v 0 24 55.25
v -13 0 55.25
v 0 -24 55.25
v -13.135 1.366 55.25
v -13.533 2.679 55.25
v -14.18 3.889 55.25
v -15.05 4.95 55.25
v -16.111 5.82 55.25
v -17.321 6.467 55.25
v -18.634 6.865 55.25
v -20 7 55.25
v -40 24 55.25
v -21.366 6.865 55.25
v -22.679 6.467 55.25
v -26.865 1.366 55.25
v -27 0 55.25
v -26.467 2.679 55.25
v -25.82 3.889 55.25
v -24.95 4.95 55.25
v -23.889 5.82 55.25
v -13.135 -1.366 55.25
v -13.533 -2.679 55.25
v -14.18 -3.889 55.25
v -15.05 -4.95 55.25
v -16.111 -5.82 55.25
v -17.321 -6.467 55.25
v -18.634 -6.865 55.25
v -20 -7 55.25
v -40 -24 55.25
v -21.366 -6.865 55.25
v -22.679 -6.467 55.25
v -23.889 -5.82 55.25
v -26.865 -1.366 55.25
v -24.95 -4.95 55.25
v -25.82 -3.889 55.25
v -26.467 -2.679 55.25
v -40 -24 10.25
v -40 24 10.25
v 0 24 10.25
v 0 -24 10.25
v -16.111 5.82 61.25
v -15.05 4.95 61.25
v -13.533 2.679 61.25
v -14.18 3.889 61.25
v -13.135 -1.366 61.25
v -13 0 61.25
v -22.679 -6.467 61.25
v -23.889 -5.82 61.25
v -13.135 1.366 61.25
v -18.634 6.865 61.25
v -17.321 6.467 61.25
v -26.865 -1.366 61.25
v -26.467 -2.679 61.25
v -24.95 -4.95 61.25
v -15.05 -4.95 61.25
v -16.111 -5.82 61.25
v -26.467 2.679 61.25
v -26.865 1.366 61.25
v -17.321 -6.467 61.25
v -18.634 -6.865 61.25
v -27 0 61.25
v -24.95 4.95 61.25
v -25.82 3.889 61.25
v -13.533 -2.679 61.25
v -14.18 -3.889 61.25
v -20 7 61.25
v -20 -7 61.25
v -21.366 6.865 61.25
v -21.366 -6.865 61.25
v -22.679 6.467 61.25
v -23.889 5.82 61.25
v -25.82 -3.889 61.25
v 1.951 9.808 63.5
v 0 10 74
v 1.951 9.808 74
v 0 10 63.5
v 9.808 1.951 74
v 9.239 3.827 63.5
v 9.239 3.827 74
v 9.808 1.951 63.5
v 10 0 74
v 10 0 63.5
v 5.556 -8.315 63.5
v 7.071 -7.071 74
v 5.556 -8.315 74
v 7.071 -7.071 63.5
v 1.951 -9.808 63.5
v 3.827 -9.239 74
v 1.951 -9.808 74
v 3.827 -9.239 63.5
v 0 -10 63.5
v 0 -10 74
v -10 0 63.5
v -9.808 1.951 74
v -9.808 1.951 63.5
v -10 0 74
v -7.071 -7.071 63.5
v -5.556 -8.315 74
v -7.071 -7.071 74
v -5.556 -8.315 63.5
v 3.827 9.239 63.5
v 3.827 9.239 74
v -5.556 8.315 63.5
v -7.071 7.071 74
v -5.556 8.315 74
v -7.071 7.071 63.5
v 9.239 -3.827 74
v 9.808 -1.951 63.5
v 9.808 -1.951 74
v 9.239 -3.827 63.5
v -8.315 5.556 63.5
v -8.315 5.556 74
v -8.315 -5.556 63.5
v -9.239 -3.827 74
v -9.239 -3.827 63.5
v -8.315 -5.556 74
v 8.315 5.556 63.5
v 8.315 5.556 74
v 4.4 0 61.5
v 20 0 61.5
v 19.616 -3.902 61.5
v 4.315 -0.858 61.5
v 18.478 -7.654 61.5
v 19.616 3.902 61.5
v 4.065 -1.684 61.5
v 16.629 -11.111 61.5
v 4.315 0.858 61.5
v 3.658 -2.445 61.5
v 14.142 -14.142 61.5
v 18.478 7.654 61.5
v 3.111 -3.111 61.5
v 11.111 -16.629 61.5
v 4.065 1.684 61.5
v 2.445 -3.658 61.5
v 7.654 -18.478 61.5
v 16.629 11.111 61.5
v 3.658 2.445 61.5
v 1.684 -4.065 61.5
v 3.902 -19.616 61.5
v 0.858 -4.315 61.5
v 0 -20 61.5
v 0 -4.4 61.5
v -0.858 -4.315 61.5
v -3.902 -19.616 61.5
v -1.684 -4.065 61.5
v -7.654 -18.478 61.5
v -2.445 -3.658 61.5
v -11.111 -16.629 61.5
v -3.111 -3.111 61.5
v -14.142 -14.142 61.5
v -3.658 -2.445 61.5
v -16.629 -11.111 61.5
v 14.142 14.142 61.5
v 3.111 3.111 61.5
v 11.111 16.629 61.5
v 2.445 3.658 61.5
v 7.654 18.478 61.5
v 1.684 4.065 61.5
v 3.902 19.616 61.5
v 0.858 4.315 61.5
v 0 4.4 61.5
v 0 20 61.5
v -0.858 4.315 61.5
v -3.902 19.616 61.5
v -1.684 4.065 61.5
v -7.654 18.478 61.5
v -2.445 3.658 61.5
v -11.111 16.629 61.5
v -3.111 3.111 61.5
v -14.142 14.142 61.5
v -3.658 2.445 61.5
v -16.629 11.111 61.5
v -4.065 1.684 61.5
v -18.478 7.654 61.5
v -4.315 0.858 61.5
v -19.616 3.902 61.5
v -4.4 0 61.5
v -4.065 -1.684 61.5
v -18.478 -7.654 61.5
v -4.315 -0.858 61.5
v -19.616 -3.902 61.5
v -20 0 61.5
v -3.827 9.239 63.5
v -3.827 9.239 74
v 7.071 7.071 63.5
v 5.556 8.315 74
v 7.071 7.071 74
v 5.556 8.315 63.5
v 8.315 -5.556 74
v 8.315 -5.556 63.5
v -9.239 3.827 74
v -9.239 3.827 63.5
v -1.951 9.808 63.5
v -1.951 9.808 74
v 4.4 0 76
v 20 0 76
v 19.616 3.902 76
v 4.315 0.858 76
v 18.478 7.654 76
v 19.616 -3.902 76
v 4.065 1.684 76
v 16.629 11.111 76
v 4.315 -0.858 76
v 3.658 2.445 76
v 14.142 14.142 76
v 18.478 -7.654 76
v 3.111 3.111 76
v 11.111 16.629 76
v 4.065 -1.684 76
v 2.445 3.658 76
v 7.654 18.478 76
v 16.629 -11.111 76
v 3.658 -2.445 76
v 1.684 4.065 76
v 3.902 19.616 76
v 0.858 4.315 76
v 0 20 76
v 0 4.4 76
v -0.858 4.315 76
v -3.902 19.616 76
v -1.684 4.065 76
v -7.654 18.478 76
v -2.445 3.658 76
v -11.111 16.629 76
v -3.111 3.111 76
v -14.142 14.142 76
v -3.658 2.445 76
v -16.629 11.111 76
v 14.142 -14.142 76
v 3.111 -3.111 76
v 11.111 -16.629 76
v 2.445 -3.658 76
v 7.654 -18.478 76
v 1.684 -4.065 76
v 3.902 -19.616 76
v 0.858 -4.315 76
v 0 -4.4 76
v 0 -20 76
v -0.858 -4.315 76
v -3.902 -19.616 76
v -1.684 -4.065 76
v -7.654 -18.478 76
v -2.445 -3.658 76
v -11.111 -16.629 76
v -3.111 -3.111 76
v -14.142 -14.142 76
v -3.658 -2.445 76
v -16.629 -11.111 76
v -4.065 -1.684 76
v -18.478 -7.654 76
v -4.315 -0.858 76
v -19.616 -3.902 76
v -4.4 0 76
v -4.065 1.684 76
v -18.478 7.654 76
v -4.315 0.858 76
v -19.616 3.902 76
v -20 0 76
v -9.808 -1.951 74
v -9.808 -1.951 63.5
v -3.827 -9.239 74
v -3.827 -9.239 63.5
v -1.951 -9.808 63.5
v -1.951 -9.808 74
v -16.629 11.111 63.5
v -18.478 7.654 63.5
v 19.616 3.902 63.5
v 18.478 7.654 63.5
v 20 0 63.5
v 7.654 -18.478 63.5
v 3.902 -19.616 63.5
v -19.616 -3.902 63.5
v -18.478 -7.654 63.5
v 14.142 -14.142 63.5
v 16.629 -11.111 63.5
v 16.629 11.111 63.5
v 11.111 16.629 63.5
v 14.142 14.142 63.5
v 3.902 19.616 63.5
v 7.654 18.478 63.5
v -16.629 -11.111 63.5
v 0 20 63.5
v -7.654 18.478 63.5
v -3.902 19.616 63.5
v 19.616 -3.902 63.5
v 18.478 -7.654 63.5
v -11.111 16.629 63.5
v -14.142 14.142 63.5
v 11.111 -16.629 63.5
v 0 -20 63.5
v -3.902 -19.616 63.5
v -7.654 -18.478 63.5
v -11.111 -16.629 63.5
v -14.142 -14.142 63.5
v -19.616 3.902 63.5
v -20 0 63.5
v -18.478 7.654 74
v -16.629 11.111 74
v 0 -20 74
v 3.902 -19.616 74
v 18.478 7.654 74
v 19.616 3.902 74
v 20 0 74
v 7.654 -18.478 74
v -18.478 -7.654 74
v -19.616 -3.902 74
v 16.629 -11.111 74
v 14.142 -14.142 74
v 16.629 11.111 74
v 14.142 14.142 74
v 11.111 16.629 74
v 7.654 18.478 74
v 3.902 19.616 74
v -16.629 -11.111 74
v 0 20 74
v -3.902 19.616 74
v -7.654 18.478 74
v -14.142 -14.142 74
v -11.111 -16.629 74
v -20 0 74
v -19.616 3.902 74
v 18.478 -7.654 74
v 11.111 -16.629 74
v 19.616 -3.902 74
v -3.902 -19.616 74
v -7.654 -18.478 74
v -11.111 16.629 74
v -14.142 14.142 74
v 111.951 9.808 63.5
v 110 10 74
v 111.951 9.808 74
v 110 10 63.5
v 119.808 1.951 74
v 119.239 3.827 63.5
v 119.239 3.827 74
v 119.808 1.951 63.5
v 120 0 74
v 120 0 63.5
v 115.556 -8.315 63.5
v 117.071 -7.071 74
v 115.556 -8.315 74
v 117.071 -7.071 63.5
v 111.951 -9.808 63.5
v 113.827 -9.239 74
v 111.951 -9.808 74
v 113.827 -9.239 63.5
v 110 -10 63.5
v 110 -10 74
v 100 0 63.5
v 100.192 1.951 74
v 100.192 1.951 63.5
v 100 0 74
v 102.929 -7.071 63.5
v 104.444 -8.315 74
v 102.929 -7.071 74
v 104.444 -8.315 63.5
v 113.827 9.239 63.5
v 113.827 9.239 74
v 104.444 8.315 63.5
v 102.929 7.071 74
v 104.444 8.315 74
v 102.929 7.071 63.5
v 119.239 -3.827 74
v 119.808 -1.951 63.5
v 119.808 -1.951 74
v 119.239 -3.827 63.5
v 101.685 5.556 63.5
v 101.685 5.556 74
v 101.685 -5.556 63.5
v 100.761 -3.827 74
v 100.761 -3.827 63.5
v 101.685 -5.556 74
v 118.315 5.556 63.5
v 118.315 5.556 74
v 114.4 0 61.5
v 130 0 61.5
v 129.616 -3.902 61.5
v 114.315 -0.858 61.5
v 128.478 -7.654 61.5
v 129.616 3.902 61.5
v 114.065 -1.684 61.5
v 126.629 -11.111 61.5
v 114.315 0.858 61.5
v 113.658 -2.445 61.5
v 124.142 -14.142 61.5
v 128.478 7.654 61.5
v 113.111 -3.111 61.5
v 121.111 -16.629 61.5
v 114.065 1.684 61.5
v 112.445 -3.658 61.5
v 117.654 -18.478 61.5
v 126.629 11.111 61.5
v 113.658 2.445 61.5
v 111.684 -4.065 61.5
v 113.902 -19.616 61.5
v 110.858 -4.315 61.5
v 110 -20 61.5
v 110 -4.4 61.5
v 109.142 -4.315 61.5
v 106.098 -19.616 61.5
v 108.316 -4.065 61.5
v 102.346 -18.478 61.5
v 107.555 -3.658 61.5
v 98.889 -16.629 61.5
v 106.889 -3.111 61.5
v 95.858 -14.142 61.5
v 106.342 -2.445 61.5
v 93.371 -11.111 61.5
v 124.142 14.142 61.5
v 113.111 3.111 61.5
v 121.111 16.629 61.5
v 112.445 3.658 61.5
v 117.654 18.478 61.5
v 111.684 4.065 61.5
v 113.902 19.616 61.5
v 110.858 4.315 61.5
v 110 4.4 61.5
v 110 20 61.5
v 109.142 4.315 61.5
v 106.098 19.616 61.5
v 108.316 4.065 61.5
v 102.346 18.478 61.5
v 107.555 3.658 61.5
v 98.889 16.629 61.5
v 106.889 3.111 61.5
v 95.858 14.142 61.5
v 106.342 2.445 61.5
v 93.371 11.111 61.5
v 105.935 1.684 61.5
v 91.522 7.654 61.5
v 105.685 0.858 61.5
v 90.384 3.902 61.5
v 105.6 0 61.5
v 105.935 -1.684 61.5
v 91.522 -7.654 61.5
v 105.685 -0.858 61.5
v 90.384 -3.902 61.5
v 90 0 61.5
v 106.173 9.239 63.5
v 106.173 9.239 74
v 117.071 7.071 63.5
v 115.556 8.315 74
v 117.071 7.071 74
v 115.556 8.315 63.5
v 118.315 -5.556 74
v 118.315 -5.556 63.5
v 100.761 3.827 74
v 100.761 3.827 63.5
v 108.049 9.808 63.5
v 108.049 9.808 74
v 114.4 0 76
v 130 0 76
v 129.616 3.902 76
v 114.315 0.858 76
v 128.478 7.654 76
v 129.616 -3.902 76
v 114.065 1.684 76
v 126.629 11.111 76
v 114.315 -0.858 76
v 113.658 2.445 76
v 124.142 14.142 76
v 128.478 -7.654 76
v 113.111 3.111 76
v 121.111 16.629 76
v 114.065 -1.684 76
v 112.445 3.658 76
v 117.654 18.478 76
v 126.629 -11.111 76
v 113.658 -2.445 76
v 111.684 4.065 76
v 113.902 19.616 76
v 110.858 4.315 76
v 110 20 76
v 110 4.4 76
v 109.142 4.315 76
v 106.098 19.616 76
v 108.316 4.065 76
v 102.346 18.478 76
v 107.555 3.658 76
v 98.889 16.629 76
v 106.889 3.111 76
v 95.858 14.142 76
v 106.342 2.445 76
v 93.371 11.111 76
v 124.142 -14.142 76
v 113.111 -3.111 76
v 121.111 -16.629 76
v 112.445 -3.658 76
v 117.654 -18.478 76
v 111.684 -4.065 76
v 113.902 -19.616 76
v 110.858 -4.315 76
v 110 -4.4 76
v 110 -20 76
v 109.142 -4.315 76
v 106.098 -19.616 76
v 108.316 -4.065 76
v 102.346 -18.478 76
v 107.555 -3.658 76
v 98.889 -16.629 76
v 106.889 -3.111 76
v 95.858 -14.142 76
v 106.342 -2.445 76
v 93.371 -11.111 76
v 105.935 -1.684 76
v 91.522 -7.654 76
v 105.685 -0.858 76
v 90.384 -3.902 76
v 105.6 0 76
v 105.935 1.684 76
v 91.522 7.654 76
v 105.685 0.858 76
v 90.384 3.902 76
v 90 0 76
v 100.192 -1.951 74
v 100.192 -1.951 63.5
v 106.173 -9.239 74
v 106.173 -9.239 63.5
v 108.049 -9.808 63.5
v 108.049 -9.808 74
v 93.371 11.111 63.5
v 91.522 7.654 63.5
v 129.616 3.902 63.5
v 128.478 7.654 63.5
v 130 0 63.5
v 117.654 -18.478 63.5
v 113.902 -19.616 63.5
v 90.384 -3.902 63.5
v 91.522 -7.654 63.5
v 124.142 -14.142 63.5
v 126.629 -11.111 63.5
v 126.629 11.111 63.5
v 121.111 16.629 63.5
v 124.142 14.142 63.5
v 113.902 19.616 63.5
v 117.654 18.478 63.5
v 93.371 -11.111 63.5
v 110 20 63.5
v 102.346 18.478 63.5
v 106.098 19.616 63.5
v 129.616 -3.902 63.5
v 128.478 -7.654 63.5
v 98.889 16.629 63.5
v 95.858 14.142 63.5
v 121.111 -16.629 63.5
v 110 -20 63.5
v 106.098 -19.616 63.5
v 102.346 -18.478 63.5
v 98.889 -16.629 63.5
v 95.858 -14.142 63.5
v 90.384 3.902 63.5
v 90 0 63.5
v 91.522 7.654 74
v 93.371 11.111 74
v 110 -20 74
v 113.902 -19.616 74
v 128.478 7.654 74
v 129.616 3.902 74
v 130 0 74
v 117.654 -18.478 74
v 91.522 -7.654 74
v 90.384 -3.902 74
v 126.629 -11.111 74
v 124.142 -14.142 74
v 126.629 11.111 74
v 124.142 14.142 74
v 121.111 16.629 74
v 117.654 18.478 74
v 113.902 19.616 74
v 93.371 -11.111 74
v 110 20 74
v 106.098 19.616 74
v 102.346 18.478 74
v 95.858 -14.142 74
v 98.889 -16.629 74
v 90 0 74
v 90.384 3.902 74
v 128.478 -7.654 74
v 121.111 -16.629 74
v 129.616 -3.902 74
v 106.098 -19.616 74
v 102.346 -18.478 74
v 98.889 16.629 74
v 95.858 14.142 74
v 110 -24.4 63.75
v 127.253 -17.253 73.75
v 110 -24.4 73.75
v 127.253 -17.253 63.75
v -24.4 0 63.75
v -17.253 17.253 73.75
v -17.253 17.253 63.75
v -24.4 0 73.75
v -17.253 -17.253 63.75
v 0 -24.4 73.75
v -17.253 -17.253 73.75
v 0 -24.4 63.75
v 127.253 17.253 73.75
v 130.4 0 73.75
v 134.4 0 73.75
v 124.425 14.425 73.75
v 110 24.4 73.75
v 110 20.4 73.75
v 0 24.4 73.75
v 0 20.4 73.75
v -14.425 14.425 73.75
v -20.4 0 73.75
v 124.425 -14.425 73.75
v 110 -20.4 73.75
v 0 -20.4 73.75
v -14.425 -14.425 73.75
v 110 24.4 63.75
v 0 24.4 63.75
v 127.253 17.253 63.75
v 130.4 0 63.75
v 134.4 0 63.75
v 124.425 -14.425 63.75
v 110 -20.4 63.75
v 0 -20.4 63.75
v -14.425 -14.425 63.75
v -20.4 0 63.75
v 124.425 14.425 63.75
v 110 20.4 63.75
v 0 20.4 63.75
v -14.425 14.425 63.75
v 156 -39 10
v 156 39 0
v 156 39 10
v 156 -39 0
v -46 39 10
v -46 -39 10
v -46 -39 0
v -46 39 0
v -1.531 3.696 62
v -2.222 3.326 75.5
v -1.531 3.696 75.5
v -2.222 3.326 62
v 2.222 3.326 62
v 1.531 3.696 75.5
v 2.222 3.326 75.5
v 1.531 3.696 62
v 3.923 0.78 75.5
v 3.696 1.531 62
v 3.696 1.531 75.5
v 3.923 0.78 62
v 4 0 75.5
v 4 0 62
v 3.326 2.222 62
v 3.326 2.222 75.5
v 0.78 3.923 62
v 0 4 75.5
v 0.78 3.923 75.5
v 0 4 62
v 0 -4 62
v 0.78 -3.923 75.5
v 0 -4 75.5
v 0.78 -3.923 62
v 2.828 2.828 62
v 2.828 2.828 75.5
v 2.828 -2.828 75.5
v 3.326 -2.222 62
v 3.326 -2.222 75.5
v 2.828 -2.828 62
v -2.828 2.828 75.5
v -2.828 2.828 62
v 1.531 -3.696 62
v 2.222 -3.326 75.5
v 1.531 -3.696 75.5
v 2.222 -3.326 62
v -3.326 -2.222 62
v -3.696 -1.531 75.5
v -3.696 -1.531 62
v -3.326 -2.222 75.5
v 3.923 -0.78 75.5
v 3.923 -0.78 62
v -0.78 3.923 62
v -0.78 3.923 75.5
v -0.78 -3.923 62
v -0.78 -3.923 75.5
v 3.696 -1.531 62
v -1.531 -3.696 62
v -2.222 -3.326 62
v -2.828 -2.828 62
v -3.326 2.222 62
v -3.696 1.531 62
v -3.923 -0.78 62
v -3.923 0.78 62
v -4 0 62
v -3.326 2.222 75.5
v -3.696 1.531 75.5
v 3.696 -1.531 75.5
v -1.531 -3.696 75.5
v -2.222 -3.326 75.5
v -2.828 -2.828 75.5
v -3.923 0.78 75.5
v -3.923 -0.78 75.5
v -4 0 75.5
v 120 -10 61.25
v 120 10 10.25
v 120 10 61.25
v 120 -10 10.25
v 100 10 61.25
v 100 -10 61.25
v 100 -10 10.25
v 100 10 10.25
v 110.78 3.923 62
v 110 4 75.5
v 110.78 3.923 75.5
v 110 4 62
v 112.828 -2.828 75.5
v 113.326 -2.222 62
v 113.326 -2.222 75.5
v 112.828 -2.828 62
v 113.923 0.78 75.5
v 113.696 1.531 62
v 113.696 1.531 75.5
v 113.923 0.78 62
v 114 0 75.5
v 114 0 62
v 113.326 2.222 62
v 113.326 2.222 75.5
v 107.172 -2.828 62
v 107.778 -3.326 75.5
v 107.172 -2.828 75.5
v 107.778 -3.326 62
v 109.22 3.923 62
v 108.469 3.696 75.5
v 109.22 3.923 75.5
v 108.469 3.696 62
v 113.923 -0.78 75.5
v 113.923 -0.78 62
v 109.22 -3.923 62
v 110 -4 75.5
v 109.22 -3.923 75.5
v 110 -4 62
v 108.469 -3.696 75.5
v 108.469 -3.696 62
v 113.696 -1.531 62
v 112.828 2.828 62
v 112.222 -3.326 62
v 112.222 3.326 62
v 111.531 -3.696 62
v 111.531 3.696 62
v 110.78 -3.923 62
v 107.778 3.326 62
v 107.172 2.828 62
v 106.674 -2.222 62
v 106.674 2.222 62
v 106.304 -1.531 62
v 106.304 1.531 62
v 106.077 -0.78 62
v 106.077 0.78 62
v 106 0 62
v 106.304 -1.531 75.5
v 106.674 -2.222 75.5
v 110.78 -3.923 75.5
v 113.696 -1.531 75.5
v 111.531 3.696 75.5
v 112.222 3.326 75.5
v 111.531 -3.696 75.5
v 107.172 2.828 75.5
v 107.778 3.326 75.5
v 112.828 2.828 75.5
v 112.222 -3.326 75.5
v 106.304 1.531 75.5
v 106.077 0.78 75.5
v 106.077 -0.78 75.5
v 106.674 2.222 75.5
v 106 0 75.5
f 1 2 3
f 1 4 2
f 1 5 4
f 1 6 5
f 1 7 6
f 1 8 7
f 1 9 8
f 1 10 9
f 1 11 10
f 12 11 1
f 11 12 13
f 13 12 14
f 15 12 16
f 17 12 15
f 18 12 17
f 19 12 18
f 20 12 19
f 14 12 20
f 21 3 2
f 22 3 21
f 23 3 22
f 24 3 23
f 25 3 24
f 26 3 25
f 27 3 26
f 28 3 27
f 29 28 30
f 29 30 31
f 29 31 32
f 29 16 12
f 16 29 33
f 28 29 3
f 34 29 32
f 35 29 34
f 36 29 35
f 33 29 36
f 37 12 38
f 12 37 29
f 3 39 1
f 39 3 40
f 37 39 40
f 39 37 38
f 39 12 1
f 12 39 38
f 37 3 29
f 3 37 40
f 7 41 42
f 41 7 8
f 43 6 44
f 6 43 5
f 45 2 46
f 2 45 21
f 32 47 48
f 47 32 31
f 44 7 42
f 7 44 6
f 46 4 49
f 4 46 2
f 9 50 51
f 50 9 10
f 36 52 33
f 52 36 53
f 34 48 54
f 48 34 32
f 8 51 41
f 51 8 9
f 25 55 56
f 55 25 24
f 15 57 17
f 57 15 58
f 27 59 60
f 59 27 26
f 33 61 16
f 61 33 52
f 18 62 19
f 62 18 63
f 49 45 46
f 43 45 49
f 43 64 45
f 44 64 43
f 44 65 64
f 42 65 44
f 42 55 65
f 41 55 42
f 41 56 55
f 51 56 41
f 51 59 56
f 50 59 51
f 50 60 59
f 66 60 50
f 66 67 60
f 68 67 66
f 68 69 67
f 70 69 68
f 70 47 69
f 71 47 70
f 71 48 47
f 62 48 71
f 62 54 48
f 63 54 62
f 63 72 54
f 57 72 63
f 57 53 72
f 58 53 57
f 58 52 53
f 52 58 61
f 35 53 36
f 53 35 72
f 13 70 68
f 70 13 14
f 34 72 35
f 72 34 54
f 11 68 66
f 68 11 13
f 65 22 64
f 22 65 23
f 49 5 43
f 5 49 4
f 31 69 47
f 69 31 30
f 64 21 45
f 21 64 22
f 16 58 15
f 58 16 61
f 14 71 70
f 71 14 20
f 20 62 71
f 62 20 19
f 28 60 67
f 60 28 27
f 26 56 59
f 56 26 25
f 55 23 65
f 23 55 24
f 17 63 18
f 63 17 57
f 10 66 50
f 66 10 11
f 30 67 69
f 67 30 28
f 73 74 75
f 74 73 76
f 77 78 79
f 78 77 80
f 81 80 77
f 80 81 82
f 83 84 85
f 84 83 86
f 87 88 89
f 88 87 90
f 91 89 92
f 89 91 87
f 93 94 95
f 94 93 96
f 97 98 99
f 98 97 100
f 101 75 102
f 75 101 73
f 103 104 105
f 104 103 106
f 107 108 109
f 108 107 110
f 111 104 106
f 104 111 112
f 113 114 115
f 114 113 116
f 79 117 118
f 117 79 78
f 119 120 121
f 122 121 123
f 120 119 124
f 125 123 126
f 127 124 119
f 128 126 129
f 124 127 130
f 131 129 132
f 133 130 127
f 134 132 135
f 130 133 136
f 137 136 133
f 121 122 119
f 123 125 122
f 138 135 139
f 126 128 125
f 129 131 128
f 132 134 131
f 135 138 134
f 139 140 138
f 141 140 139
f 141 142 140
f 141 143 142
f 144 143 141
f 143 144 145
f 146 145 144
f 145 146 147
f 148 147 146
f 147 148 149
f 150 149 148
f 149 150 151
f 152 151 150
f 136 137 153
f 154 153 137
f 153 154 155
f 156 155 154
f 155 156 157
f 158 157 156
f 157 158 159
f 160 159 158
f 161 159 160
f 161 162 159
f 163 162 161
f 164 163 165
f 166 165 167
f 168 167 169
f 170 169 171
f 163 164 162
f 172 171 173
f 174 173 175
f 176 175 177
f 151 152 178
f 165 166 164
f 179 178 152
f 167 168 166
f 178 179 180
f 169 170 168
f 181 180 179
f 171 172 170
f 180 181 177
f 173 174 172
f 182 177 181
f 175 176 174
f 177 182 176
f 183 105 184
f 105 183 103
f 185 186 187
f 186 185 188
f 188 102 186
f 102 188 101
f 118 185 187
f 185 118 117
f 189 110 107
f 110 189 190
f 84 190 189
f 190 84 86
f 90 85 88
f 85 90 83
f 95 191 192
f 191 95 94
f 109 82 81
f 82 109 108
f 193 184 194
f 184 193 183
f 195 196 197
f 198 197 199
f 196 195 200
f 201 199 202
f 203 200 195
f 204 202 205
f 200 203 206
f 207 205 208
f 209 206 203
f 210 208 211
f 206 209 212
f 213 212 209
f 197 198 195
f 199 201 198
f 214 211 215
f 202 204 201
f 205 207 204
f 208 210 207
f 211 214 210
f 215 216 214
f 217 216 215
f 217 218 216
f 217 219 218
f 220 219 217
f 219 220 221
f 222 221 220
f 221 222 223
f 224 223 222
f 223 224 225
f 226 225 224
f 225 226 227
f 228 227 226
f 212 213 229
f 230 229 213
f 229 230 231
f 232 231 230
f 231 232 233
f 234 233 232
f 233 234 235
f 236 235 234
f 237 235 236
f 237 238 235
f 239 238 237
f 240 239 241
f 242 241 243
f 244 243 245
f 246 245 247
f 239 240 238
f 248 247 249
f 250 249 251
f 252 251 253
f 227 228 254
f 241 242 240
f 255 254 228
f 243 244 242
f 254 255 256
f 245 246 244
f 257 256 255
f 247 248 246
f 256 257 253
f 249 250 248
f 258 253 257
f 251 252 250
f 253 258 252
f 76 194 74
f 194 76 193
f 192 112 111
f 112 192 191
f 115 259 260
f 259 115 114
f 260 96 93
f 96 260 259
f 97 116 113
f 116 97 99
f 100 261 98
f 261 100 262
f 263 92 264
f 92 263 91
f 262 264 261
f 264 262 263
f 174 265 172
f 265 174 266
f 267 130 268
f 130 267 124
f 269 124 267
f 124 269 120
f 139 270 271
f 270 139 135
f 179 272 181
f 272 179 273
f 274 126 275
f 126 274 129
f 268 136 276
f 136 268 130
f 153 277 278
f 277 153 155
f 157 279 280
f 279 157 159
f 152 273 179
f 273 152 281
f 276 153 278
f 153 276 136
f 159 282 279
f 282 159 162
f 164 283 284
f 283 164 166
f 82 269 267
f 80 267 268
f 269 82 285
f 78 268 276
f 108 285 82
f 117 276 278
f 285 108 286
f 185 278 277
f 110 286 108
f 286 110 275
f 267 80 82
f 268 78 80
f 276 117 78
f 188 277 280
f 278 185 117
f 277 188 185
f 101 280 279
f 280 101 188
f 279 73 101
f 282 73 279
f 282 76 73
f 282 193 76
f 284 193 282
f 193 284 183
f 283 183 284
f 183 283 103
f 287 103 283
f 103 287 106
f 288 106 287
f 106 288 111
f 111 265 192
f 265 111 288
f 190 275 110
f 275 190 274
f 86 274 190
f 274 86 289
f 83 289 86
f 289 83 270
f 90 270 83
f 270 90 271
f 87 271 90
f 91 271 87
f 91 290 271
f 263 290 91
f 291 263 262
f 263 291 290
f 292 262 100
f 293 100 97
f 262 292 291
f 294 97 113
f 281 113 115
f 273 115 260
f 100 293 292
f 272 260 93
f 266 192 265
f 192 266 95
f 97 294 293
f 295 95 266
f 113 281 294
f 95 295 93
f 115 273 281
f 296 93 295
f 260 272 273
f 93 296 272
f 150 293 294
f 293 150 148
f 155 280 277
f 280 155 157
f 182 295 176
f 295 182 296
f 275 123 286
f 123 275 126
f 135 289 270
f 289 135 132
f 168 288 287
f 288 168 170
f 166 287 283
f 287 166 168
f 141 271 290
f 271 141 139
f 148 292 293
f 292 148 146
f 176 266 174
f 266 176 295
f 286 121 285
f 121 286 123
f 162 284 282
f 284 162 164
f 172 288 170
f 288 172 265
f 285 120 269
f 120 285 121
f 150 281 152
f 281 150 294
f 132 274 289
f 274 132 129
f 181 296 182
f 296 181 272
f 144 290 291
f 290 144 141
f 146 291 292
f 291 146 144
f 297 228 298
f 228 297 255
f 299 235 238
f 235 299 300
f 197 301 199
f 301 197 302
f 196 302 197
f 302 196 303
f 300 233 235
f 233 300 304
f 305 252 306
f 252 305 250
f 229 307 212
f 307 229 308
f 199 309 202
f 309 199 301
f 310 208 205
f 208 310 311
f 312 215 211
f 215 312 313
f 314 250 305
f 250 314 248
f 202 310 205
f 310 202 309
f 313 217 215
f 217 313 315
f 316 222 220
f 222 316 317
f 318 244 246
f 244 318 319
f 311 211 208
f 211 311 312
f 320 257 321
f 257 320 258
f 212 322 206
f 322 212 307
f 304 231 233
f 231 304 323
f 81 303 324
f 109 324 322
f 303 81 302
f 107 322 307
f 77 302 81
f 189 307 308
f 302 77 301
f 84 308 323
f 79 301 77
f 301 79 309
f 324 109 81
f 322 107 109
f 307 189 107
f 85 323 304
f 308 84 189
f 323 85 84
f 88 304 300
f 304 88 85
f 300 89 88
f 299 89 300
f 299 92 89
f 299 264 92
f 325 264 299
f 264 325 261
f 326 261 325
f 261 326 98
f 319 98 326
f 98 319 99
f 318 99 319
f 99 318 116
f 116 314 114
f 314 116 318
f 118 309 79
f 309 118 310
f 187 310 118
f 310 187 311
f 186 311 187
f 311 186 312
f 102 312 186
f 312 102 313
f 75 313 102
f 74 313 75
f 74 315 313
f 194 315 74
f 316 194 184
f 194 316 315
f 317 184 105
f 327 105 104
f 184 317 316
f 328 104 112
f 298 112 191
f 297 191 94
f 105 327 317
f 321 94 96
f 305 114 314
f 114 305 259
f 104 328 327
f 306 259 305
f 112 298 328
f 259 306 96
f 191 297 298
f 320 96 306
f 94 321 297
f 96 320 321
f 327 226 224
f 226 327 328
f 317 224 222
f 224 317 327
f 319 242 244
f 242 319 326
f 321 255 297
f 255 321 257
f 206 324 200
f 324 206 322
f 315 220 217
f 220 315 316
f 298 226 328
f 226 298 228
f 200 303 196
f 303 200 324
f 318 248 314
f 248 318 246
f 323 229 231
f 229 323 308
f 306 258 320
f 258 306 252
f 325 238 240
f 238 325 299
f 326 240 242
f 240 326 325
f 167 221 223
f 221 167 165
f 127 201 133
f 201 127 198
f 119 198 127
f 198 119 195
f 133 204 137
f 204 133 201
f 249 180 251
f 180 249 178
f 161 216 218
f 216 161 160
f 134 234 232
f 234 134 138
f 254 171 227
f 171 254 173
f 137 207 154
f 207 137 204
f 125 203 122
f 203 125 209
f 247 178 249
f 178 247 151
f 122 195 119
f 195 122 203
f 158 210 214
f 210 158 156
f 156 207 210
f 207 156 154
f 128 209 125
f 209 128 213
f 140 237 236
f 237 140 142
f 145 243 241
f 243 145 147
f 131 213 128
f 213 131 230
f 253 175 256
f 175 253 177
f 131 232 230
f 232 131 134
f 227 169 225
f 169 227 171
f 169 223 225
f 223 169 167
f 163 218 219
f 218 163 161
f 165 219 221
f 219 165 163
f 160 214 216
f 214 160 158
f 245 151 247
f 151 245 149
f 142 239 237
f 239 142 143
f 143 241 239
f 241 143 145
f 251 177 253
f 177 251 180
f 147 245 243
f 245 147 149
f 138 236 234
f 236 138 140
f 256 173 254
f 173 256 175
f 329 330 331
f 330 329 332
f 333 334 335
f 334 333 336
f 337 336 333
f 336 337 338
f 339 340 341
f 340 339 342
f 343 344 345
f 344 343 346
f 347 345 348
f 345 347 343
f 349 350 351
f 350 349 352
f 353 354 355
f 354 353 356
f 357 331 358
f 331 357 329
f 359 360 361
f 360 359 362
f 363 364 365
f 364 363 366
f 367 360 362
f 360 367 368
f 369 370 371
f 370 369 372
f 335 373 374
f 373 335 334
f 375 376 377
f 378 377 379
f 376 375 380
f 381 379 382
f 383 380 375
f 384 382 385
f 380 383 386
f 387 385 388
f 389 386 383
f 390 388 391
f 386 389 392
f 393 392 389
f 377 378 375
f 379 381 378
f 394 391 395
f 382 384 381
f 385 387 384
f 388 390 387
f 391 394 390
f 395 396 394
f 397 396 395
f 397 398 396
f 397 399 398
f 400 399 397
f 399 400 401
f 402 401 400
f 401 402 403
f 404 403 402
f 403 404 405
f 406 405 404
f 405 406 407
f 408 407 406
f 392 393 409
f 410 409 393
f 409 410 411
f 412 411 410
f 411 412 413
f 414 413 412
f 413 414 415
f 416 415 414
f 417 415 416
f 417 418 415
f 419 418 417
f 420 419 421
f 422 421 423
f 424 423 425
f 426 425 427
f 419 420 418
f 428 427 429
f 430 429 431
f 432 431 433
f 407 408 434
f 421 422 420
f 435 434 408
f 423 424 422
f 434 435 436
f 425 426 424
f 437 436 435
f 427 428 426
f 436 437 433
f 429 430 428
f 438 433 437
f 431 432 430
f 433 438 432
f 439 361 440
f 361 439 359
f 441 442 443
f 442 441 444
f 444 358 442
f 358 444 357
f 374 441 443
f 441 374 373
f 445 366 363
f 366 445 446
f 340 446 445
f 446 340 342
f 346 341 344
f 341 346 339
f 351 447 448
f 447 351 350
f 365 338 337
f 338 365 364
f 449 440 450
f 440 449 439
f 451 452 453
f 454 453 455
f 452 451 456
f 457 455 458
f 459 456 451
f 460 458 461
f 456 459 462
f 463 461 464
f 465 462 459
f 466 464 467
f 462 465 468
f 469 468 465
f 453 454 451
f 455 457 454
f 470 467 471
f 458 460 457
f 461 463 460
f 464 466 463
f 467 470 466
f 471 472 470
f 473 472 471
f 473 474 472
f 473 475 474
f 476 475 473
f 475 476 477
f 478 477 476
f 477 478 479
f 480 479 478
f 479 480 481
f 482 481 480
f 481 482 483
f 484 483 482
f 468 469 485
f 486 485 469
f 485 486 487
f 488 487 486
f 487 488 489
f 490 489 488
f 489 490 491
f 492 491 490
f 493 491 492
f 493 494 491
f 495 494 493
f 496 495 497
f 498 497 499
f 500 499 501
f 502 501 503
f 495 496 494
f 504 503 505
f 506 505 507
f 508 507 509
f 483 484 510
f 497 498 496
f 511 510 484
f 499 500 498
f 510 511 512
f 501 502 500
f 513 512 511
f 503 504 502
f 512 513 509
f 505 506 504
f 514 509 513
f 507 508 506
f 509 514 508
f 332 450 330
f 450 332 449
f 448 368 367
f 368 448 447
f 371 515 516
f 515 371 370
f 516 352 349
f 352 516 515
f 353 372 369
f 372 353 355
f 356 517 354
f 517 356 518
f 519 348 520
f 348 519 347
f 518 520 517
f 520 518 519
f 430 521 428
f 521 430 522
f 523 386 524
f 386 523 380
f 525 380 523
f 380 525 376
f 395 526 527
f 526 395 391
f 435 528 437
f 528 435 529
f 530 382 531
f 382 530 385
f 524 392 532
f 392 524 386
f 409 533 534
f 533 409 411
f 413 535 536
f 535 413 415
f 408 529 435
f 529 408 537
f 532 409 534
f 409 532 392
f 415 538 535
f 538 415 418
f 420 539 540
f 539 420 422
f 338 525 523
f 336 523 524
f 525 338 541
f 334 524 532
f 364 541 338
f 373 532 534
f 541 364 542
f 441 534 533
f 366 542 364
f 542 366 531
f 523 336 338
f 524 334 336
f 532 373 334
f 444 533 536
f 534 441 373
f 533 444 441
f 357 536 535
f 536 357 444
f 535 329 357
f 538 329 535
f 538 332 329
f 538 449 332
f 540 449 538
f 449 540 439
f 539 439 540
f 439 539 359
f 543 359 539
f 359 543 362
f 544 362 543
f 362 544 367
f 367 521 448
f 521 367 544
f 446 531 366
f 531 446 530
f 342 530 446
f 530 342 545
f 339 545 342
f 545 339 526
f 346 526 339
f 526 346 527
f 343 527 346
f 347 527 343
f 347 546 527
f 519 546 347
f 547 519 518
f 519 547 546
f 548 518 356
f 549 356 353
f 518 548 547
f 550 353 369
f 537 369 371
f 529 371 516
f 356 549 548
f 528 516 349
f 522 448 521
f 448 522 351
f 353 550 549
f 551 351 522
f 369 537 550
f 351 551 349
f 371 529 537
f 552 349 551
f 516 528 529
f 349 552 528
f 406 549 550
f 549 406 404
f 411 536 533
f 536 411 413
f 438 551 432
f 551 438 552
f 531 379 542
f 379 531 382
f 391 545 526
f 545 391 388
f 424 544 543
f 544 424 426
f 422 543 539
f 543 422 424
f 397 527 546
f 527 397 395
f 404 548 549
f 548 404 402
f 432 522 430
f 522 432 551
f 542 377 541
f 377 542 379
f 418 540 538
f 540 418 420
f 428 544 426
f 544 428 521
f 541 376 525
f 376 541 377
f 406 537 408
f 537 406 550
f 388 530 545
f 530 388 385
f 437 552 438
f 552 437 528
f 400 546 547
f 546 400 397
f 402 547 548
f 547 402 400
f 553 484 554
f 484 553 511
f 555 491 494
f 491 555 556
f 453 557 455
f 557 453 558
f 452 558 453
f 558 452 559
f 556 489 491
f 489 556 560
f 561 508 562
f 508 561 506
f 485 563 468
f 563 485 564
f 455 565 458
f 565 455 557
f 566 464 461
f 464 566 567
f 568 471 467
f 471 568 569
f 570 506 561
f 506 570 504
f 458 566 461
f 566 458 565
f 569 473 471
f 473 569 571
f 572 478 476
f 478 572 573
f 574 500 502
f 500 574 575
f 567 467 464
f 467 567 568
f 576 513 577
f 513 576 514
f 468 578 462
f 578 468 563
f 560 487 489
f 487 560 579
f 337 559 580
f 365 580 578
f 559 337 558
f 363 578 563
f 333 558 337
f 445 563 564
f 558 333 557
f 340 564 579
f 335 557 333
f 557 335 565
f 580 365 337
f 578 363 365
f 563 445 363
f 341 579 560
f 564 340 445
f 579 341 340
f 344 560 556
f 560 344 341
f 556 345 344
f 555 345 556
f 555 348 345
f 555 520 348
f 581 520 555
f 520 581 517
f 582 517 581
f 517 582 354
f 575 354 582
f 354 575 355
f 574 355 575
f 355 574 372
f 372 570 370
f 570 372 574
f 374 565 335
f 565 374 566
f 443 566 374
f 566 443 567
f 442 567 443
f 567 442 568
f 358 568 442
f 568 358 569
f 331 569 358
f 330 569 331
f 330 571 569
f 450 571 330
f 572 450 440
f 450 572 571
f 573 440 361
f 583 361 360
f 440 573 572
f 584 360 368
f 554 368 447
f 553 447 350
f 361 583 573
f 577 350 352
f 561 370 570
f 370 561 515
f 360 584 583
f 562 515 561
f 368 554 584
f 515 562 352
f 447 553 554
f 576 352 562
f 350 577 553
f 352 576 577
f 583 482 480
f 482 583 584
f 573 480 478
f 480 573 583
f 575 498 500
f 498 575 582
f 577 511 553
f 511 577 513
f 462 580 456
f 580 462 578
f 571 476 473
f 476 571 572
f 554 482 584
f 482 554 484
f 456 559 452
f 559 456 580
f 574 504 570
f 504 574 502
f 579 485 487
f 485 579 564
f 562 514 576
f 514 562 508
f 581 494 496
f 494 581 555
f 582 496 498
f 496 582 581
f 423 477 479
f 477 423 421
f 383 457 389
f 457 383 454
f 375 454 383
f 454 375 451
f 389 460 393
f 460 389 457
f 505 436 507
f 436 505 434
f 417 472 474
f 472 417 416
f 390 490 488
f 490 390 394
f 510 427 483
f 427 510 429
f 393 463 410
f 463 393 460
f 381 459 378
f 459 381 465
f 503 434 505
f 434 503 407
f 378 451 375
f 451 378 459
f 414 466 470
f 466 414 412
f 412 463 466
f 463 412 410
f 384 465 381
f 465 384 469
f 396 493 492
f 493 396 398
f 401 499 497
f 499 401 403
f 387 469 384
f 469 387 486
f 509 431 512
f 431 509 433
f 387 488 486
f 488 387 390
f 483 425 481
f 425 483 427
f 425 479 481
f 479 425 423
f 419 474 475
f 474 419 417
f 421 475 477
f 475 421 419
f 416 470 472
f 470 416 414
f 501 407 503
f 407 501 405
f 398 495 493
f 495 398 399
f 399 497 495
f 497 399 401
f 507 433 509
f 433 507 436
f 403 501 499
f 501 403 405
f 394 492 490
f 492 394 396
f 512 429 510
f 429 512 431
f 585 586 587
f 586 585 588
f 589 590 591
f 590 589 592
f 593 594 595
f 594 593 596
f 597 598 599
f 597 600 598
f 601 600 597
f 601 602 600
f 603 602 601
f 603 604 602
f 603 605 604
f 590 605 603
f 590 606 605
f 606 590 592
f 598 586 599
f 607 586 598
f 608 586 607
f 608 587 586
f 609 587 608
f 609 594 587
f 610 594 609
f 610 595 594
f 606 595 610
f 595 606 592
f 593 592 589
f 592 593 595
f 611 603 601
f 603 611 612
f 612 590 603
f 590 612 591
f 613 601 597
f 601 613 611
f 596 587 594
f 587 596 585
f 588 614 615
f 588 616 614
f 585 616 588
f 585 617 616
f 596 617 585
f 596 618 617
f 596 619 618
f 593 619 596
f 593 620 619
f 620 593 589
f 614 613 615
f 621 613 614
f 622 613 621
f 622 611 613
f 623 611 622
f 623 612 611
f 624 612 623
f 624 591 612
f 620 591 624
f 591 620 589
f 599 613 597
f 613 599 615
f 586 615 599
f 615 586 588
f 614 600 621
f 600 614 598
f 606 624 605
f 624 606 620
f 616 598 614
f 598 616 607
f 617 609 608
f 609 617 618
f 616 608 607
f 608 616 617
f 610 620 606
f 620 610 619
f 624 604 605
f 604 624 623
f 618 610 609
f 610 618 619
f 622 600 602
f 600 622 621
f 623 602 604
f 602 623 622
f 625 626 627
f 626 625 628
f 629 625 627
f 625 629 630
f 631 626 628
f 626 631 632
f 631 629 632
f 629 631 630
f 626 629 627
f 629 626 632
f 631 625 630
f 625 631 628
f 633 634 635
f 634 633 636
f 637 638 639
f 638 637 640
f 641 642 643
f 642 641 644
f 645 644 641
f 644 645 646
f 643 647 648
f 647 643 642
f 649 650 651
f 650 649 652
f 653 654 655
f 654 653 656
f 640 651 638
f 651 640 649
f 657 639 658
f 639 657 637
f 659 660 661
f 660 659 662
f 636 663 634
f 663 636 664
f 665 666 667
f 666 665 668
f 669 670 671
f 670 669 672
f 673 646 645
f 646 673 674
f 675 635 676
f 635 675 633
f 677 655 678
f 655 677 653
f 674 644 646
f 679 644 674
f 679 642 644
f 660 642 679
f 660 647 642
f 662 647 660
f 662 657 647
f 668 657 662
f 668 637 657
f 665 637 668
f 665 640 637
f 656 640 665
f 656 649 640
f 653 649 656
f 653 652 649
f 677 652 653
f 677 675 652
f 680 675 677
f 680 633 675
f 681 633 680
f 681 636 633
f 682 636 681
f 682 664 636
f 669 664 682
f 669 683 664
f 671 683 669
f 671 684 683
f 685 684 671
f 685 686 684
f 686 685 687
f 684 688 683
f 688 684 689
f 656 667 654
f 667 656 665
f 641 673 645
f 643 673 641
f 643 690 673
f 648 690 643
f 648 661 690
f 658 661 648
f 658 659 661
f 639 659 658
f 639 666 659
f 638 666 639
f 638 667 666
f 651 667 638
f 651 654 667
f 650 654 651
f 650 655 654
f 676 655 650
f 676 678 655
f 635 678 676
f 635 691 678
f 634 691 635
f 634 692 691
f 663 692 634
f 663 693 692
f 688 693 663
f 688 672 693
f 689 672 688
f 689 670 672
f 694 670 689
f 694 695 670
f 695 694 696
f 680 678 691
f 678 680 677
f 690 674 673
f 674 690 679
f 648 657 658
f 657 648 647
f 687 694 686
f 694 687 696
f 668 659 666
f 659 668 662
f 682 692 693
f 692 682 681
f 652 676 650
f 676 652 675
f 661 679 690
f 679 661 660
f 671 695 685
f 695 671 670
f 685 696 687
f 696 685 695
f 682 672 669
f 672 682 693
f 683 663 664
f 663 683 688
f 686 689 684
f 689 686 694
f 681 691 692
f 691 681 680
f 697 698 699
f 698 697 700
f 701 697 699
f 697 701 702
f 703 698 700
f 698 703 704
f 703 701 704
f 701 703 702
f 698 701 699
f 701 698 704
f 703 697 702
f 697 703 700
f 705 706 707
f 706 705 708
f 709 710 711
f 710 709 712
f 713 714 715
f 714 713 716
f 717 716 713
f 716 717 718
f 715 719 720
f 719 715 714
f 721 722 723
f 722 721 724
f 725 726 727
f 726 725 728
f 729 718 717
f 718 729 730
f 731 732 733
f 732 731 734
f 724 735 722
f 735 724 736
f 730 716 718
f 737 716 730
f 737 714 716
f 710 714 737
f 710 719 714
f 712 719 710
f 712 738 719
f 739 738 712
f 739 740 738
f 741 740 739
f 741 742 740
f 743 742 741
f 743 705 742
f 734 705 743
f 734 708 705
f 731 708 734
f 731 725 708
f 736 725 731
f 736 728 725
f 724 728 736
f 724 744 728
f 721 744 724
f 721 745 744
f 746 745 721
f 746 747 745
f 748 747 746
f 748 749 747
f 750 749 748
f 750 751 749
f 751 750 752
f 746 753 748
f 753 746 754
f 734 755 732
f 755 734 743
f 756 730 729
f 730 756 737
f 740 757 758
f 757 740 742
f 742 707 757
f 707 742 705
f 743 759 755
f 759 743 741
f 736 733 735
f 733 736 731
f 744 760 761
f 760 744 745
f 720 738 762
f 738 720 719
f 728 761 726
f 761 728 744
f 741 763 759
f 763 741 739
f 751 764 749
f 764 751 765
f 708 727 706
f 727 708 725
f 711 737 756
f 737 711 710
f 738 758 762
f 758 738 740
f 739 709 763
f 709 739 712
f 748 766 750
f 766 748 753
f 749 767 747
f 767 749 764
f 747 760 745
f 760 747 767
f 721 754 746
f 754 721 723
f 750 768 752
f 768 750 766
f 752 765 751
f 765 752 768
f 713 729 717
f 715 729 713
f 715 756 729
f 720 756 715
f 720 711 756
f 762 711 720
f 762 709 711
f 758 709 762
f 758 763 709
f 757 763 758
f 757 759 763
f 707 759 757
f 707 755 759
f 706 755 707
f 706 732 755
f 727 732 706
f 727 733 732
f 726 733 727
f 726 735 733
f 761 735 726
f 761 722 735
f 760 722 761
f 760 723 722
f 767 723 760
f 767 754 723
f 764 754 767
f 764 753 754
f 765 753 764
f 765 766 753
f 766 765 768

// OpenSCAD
$fn = 32;

// ------------------------------------------------------------------------
// Motor belt drive: span 110 mm, pulleys d40, belt 10 mm wide
// Every part is its own module, assembly() places every instance.
// ------------------------------------------------------------------------

// --- part 1 ---
module base_plate() {
  difference() {
    translate([-101, -39, 0]) cube([202, 78, 10]);
  }
}

// --- part 2 ---
module motor() {
  union() {
    translate([-22.5, -24, 0]) cube([45, 48, 40]);
    translate([25.5, 0, 20]) rotate([0, 90, 0]) cylinder(h = 6, d = 14, center = true);
  }
}

// --- part 3 ---
module drive_shaft() {
  translate([0, 0, -6.75]) cylinder(h = 13.5, d = 8);
}

// --- part 4 ---
module pulley_drive() {
  difference() {
    union() {
      cylinder(h = 14.5, d = 20);
      cylinder(h = 2, d = 40);
      translate([0, 0, 12.5]) cylinder(h = 2, d = 40);
    }
    translate([0, 0, -1]) cylinder(h = 16.5, d = 8.8);
  }
}

// --- part 5 ---
module idler_post() {
  translate([-10, -10, 0]) cube([20, 20, 51]);
}

// --- part 6 ---
module driven_shaft() {
  translate([0, 0, -6.75]) cylinder(h = 13.5, d = 8);
}

// --- part 7 ---
module pulley_driven() {
  difference() {
    union() {
      cylinder(h = 14.5, d = 20);
      cylinder(h = 2, d = 40);
      translate([0, 0, 12.5]) cylinder(h = 2, d = 40);
    }
    translate([0, 0, -1]) cylinder(h = 16.5, d = 8.8);
  }
}

// --- part 8 ---
module drive_belt() {
  difference() {
    linear_extrude(height = 10) polygon(points = concat([for (a = [90 : 45 : 270]) [24.4 * cos(a), 24.4 * sin(a)]], [for (a = [270 : 45 : 450]) [110 + 24.4 * cos(a), 24.4 * sin(a)]]));
    translate([0, 0, -1]) linear_extrude(height = 12) polygon(points = concat([for (a = [90 : 45 : 270]) [20.4 * cos(a), 20.4 * sin(a)]], [for (a = [270 : 45 : 450]) [110 + 20.4 * cos(a), 20.4 * sin(a)]]));
  }
}

// --- assembly ---
module assembly() {
  color([0.80, 0.24, 0.20]) translate([55, 0, 0]) rotate([0, 0, 0]) base_plate();
  color([0.20, 0.45, 0.75]) translate([0, 0, 32.75]) rotate([0, 270, 0]) motor();
  color([0.25, 0.62, 0.32]) translate([0, 0, 68.75]) rotate([0, 0, 0]) drive_shaft();
  color([0.92, 0.70, 0.18]) translate([0, 0, 61.5]) rotate([0, 0, 0]) pulley_drive();
  color([0.58, 0.35, 0.70]) translate([110, 0, 10.25]) rotate([0, 0, 0]) idler_post();
  color([0.16, 0.66, 0.66]) translate([110, 0, 68.75]) rotate([0, 0, 0]) driven_shaft();
  color([0.85, 0.48, 0.18]) translate([110, 0, 61.5]) rotate([0, 0, 0]) pulley_driven();
  color([0.55, 0.60, 0.65]) translate([0, 0, 63.75]) rotate([0, 0, 0]) drive_belt();
}

assembly();
